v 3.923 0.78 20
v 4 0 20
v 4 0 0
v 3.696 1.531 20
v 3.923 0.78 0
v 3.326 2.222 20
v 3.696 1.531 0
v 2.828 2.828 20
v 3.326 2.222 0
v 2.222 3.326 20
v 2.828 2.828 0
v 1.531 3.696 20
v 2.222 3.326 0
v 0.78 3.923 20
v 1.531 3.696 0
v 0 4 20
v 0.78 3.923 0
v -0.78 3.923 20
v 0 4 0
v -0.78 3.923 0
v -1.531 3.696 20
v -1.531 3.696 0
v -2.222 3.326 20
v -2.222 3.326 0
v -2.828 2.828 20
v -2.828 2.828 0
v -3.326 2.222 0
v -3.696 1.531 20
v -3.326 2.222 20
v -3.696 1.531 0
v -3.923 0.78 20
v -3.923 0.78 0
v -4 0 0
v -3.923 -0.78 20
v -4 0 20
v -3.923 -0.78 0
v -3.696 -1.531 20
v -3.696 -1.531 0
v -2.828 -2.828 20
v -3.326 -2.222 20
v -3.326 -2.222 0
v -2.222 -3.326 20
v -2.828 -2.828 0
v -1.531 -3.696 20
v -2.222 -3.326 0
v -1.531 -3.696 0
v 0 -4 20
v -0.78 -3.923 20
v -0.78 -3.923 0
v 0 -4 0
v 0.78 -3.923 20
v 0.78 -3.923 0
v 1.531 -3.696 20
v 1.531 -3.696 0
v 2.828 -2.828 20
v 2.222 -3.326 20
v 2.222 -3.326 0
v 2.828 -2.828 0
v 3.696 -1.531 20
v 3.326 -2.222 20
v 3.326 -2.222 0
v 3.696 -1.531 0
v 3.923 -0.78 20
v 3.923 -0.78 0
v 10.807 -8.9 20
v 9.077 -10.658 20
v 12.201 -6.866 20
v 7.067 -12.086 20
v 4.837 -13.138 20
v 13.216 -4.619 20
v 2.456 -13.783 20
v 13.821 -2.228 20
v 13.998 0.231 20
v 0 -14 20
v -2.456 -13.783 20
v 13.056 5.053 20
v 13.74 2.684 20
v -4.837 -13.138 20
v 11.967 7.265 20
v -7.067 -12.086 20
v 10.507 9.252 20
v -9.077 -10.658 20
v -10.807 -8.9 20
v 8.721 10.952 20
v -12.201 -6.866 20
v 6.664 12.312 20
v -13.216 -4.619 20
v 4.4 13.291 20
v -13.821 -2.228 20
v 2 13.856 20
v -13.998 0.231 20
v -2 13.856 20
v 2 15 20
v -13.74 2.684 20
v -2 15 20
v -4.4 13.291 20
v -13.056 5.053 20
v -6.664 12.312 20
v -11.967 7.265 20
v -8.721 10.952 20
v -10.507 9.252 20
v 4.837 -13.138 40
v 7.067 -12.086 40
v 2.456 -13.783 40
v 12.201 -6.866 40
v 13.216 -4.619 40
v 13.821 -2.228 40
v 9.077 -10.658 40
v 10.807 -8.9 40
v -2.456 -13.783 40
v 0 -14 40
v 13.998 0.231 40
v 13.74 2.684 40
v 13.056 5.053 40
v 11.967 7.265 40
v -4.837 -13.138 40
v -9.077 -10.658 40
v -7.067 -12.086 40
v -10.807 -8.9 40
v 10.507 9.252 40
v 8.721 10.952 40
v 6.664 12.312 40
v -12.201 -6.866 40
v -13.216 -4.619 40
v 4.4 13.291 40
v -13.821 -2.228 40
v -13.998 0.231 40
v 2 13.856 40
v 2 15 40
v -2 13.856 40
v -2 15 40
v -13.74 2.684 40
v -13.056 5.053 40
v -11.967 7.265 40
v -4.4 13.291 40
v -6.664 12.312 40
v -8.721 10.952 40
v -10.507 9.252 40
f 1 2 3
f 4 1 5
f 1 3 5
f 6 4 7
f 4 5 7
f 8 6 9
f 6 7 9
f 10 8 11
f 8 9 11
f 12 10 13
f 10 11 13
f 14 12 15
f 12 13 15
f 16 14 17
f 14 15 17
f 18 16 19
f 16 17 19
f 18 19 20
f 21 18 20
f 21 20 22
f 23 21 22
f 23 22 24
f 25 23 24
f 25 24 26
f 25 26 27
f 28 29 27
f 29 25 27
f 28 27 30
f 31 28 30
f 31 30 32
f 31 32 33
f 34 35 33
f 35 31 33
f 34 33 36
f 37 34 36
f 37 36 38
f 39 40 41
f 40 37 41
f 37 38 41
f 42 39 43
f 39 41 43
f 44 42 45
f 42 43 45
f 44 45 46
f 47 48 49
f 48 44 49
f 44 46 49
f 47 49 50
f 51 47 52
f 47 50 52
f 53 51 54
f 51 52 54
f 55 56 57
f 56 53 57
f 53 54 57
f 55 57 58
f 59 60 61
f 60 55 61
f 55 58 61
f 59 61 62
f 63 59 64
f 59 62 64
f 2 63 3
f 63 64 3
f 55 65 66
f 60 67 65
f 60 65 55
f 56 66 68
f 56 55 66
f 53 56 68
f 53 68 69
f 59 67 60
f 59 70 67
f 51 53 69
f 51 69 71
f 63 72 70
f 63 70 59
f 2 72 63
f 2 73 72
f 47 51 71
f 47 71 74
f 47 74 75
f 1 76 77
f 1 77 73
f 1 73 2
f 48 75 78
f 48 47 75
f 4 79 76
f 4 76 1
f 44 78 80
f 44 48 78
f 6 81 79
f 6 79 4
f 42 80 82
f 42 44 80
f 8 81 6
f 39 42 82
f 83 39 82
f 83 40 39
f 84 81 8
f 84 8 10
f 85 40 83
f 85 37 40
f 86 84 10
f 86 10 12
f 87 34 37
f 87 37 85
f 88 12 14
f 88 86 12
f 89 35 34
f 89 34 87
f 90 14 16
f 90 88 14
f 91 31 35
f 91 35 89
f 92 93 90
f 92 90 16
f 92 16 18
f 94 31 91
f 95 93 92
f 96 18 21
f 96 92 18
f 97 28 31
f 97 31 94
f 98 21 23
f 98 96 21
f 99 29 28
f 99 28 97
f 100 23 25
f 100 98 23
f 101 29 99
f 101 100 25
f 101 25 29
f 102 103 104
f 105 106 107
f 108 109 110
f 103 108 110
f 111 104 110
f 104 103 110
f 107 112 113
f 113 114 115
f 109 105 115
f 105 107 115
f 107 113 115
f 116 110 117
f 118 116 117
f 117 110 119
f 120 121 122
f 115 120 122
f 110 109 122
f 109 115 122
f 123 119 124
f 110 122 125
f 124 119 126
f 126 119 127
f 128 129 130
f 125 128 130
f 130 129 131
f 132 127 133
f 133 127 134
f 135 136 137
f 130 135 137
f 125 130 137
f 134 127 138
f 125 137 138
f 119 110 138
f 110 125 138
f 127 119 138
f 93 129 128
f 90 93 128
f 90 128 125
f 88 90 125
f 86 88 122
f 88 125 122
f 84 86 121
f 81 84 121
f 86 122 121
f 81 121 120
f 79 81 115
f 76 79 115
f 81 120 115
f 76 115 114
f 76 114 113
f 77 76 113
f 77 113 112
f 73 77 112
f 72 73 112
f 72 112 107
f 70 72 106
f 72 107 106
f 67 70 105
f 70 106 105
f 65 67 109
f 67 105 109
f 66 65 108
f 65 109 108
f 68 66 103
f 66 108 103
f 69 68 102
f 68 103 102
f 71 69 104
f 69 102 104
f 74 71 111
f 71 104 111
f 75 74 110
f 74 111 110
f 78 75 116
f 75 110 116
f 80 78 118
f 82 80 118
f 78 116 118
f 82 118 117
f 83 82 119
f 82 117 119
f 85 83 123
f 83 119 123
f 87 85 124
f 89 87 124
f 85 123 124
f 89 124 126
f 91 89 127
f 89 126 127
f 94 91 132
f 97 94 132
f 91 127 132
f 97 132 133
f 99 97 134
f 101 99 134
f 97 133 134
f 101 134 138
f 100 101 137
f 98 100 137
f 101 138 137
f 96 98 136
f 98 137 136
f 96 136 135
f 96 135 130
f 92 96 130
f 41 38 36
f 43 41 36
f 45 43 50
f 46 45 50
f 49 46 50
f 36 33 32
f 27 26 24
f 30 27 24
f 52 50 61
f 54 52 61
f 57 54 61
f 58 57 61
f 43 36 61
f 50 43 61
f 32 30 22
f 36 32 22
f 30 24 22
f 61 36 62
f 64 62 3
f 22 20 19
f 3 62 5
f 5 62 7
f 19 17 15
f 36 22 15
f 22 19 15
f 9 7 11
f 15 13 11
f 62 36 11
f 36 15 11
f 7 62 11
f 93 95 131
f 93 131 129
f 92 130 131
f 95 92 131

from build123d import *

# Parameters (mm, degrees)
SKETCH1_R           = 4
BOSS_EXTRUDE1_DEPTH = 40
BOSS_EXTRUDE2_DEPTH = 20


with BuildPart() as part:
    # Sketch1 → Boss-Extrude1 (new body)
    with BuildSketch(Plane.XY):
        Circle(SKETCH1_R)
    extrude(amount=BOSS_EXTRUDE1_DEPTH)

    # Sketch2 → Boss-Extrude2 (add)
    with BuildSketch(Plane.XY.offset(40)):
        with BuildLine():
            Line((-2, 13.856406461), (-2, 15))
            Line((-2, 15), (2, 15))
            Line((2, 15), (2, 13.856406461))
            ThreePointArc((2, 13.856406461), (0, -14), (-2, 13.856406461))
        make_face()
    extrude(amount=-BOSS_EXTRUDE2_DEPTH)


solid = part.part
